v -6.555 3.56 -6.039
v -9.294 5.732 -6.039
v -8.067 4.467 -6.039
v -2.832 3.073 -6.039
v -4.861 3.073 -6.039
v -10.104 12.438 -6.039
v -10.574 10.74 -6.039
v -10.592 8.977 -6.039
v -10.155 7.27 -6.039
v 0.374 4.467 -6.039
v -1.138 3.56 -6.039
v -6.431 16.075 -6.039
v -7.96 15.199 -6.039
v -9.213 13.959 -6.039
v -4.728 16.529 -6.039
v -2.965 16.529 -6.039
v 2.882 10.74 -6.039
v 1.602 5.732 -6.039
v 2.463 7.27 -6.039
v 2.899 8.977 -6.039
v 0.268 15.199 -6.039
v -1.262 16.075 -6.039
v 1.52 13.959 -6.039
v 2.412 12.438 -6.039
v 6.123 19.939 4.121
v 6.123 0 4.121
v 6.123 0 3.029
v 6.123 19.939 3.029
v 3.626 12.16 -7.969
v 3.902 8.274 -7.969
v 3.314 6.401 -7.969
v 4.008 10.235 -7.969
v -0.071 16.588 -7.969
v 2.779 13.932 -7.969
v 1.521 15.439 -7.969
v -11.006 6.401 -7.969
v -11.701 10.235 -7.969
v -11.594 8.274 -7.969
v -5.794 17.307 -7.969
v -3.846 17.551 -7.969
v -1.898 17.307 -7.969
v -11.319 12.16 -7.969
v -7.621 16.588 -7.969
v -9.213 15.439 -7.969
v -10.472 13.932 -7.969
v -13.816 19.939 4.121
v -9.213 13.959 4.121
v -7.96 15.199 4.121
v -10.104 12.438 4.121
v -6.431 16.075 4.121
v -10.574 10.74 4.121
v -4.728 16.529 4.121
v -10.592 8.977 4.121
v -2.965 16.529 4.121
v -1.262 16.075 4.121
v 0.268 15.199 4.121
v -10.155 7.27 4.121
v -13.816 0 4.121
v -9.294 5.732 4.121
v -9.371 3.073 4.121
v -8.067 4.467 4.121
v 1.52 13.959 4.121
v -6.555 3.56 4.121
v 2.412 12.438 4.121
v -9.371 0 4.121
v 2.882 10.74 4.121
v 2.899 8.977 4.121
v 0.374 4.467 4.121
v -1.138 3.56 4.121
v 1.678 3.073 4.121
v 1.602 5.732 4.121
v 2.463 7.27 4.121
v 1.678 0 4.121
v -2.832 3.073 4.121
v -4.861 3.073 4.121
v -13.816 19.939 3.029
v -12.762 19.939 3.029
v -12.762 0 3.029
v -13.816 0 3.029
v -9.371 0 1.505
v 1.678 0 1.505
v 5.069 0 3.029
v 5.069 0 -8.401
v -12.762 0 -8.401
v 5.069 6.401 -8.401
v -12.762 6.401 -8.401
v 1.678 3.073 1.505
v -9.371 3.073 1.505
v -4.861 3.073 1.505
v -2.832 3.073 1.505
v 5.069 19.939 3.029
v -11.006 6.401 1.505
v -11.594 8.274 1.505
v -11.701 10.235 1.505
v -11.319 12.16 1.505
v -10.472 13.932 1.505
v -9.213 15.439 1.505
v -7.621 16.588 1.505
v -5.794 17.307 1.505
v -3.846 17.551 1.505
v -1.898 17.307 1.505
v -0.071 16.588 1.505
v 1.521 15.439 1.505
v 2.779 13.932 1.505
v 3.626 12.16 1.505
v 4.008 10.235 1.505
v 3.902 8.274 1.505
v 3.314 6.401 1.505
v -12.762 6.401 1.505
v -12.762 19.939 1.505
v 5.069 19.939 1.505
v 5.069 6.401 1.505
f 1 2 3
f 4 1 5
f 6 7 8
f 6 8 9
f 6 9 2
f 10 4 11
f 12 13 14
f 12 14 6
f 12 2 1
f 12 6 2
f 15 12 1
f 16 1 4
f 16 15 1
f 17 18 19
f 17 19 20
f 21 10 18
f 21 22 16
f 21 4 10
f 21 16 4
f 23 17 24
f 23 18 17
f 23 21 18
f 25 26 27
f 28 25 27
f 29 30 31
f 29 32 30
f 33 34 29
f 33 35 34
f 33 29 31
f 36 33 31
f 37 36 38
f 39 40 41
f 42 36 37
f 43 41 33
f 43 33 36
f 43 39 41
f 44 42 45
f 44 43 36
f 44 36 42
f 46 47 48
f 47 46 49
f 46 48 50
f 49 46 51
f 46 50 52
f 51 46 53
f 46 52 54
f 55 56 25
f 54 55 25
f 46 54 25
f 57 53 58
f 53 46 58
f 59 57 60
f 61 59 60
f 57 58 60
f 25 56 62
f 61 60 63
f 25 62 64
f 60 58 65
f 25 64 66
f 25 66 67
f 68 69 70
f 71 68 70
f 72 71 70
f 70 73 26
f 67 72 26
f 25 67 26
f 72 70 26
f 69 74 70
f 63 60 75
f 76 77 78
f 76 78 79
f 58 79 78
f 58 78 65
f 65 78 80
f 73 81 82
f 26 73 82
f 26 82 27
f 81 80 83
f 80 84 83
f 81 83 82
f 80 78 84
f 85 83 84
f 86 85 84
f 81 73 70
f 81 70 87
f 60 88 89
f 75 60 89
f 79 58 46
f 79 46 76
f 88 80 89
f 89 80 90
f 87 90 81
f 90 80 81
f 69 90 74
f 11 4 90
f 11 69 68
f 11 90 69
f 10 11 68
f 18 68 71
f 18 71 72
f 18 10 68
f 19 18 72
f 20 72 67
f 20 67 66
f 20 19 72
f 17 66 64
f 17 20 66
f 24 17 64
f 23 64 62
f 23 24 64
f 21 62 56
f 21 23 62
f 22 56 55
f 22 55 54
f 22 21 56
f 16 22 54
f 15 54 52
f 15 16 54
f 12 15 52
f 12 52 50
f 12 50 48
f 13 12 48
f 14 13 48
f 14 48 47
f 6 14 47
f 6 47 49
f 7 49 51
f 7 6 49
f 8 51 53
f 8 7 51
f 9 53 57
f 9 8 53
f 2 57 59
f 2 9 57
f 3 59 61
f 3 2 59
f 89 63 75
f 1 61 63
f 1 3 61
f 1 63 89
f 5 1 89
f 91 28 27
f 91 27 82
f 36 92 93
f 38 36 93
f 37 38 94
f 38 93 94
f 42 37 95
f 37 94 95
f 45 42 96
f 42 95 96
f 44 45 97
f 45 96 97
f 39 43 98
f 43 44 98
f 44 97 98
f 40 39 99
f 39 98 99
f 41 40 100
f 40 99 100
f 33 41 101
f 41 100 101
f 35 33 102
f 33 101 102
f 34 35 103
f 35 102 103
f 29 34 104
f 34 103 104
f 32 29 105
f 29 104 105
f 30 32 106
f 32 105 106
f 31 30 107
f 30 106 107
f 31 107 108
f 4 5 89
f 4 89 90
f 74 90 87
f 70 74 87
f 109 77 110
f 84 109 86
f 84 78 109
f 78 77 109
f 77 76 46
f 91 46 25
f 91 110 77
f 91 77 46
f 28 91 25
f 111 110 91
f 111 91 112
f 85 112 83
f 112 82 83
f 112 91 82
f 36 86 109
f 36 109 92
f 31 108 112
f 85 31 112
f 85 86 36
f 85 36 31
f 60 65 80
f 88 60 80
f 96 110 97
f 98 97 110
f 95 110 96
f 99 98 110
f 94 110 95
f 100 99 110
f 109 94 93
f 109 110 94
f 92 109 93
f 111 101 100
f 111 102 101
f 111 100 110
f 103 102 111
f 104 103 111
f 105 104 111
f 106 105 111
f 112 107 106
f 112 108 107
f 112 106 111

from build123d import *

# Parameters (mm, degrees)
BOSS_EXTRUDE1_DEPTH = 6.4008
BOSS_EXTRUDE2_DEPTH = 19.939
SKETCH1_4_W         = 11.049
SKETCH1_4_H         = 2.6162
CUT_EXTRUDE1_DEPTH  = 3.0734
SKETCH2_R           = 7.874
BOSS_EXTRUDE3_DEPTH = 9.4742
CUT_EXTRUDE2_DEPTH  = 10.16


with BuildPart() as part:
    # Sketch1 → Boss-Extrude1 (new body)
    with BuildSketch(Plane(origin=(0, 0, 0), x_dir=(1, 0, 0), z_dir=(0, 1, 0))):
        Polygon((1.678214286, -1.50495), (5.069114286, -1.50495), (5.069114286, 8.40105), (-12.761685714, 8.40105), (-12.761685714, -1.50495), (-9.370785714, -1.50495), (-9.370785714, -4.12115), (1.678214286, -4.12115), align=None)
    extrude(amount=BOSS_EXTRUDE1_DEPTH)

    # Sketch1<3> → Boss-Extrude2 (add)
    with BuildSketch(Plane(origin=(0, 0, 0), x_dir=(1, 0, 0), z_dir=(0, 1, 0))):
        Polygon((5.069114286, -3.02895), (5.069114286, -1.50495), (-12.761685714, -1.50495), (-12.761685714, -3.02895), (-13.815785714, -3.02895), (-13.815785714, -4.12115), (6.123214286, -4.12115), (6.123214286, -3.02895), align=None)
    extrude(amount=BOSS_EXTRUDE2_DEPTH)

    # Sketch1<4> → Cut-Extrude1 (cut)
    with BuildSketch(Plane(origin=(0, 0, 0), x_dir=(1, 0, 0), z_dir=(0, 1, 0))):
        with Locations((-3.846285714, -2.81305)):
            Rectangle(SKETCH1_4_W, SKETCH1_4_H)
    extrude(amount=CUT_EXTRUDE1_DEPTH, mode=Mode.SUBTRACT)

    # Sketch2 → Boss-Extrude3 (add)
    with BuildSketch(Plane(origin=(0, 0, 1.50495), x_dir=(-1, 0, 0), z_dir=(0, 0, -1))):
        with Locations((3.846285714, 9.6774)):
            Circle(SKETCH2_R)
    extrude(amount=BOSS_EXTRUDE3_DEPTH)

    # Sketch3 → Cut-Extrude2 (cut)
    with BuildSketch(Plane.XY.offset(4.12115)):
        with BuildLine():
            ThreePointArc((-2.831556509, 3.0734), (1.304433063, 5.360523369), (2.948214286, 9.7917))
            ThreePointArc((2.948214286, 9.7917), (0.95815131, 14.596137025), (-3.846285714, 16.5862))
            ThreePointArc((-3.846285714, 16.5862), (-10.621708934, 10.300493131), (-4.86101492, 3.0734))
            Line((-4.86101492, 3.0734), (-2.831556509, 3.0734))
        make_face()
    extrude(amount=-CUT_EXTRUDE2_DEPTH, mode=Mode.SUBTRACT)


solid = part.part
